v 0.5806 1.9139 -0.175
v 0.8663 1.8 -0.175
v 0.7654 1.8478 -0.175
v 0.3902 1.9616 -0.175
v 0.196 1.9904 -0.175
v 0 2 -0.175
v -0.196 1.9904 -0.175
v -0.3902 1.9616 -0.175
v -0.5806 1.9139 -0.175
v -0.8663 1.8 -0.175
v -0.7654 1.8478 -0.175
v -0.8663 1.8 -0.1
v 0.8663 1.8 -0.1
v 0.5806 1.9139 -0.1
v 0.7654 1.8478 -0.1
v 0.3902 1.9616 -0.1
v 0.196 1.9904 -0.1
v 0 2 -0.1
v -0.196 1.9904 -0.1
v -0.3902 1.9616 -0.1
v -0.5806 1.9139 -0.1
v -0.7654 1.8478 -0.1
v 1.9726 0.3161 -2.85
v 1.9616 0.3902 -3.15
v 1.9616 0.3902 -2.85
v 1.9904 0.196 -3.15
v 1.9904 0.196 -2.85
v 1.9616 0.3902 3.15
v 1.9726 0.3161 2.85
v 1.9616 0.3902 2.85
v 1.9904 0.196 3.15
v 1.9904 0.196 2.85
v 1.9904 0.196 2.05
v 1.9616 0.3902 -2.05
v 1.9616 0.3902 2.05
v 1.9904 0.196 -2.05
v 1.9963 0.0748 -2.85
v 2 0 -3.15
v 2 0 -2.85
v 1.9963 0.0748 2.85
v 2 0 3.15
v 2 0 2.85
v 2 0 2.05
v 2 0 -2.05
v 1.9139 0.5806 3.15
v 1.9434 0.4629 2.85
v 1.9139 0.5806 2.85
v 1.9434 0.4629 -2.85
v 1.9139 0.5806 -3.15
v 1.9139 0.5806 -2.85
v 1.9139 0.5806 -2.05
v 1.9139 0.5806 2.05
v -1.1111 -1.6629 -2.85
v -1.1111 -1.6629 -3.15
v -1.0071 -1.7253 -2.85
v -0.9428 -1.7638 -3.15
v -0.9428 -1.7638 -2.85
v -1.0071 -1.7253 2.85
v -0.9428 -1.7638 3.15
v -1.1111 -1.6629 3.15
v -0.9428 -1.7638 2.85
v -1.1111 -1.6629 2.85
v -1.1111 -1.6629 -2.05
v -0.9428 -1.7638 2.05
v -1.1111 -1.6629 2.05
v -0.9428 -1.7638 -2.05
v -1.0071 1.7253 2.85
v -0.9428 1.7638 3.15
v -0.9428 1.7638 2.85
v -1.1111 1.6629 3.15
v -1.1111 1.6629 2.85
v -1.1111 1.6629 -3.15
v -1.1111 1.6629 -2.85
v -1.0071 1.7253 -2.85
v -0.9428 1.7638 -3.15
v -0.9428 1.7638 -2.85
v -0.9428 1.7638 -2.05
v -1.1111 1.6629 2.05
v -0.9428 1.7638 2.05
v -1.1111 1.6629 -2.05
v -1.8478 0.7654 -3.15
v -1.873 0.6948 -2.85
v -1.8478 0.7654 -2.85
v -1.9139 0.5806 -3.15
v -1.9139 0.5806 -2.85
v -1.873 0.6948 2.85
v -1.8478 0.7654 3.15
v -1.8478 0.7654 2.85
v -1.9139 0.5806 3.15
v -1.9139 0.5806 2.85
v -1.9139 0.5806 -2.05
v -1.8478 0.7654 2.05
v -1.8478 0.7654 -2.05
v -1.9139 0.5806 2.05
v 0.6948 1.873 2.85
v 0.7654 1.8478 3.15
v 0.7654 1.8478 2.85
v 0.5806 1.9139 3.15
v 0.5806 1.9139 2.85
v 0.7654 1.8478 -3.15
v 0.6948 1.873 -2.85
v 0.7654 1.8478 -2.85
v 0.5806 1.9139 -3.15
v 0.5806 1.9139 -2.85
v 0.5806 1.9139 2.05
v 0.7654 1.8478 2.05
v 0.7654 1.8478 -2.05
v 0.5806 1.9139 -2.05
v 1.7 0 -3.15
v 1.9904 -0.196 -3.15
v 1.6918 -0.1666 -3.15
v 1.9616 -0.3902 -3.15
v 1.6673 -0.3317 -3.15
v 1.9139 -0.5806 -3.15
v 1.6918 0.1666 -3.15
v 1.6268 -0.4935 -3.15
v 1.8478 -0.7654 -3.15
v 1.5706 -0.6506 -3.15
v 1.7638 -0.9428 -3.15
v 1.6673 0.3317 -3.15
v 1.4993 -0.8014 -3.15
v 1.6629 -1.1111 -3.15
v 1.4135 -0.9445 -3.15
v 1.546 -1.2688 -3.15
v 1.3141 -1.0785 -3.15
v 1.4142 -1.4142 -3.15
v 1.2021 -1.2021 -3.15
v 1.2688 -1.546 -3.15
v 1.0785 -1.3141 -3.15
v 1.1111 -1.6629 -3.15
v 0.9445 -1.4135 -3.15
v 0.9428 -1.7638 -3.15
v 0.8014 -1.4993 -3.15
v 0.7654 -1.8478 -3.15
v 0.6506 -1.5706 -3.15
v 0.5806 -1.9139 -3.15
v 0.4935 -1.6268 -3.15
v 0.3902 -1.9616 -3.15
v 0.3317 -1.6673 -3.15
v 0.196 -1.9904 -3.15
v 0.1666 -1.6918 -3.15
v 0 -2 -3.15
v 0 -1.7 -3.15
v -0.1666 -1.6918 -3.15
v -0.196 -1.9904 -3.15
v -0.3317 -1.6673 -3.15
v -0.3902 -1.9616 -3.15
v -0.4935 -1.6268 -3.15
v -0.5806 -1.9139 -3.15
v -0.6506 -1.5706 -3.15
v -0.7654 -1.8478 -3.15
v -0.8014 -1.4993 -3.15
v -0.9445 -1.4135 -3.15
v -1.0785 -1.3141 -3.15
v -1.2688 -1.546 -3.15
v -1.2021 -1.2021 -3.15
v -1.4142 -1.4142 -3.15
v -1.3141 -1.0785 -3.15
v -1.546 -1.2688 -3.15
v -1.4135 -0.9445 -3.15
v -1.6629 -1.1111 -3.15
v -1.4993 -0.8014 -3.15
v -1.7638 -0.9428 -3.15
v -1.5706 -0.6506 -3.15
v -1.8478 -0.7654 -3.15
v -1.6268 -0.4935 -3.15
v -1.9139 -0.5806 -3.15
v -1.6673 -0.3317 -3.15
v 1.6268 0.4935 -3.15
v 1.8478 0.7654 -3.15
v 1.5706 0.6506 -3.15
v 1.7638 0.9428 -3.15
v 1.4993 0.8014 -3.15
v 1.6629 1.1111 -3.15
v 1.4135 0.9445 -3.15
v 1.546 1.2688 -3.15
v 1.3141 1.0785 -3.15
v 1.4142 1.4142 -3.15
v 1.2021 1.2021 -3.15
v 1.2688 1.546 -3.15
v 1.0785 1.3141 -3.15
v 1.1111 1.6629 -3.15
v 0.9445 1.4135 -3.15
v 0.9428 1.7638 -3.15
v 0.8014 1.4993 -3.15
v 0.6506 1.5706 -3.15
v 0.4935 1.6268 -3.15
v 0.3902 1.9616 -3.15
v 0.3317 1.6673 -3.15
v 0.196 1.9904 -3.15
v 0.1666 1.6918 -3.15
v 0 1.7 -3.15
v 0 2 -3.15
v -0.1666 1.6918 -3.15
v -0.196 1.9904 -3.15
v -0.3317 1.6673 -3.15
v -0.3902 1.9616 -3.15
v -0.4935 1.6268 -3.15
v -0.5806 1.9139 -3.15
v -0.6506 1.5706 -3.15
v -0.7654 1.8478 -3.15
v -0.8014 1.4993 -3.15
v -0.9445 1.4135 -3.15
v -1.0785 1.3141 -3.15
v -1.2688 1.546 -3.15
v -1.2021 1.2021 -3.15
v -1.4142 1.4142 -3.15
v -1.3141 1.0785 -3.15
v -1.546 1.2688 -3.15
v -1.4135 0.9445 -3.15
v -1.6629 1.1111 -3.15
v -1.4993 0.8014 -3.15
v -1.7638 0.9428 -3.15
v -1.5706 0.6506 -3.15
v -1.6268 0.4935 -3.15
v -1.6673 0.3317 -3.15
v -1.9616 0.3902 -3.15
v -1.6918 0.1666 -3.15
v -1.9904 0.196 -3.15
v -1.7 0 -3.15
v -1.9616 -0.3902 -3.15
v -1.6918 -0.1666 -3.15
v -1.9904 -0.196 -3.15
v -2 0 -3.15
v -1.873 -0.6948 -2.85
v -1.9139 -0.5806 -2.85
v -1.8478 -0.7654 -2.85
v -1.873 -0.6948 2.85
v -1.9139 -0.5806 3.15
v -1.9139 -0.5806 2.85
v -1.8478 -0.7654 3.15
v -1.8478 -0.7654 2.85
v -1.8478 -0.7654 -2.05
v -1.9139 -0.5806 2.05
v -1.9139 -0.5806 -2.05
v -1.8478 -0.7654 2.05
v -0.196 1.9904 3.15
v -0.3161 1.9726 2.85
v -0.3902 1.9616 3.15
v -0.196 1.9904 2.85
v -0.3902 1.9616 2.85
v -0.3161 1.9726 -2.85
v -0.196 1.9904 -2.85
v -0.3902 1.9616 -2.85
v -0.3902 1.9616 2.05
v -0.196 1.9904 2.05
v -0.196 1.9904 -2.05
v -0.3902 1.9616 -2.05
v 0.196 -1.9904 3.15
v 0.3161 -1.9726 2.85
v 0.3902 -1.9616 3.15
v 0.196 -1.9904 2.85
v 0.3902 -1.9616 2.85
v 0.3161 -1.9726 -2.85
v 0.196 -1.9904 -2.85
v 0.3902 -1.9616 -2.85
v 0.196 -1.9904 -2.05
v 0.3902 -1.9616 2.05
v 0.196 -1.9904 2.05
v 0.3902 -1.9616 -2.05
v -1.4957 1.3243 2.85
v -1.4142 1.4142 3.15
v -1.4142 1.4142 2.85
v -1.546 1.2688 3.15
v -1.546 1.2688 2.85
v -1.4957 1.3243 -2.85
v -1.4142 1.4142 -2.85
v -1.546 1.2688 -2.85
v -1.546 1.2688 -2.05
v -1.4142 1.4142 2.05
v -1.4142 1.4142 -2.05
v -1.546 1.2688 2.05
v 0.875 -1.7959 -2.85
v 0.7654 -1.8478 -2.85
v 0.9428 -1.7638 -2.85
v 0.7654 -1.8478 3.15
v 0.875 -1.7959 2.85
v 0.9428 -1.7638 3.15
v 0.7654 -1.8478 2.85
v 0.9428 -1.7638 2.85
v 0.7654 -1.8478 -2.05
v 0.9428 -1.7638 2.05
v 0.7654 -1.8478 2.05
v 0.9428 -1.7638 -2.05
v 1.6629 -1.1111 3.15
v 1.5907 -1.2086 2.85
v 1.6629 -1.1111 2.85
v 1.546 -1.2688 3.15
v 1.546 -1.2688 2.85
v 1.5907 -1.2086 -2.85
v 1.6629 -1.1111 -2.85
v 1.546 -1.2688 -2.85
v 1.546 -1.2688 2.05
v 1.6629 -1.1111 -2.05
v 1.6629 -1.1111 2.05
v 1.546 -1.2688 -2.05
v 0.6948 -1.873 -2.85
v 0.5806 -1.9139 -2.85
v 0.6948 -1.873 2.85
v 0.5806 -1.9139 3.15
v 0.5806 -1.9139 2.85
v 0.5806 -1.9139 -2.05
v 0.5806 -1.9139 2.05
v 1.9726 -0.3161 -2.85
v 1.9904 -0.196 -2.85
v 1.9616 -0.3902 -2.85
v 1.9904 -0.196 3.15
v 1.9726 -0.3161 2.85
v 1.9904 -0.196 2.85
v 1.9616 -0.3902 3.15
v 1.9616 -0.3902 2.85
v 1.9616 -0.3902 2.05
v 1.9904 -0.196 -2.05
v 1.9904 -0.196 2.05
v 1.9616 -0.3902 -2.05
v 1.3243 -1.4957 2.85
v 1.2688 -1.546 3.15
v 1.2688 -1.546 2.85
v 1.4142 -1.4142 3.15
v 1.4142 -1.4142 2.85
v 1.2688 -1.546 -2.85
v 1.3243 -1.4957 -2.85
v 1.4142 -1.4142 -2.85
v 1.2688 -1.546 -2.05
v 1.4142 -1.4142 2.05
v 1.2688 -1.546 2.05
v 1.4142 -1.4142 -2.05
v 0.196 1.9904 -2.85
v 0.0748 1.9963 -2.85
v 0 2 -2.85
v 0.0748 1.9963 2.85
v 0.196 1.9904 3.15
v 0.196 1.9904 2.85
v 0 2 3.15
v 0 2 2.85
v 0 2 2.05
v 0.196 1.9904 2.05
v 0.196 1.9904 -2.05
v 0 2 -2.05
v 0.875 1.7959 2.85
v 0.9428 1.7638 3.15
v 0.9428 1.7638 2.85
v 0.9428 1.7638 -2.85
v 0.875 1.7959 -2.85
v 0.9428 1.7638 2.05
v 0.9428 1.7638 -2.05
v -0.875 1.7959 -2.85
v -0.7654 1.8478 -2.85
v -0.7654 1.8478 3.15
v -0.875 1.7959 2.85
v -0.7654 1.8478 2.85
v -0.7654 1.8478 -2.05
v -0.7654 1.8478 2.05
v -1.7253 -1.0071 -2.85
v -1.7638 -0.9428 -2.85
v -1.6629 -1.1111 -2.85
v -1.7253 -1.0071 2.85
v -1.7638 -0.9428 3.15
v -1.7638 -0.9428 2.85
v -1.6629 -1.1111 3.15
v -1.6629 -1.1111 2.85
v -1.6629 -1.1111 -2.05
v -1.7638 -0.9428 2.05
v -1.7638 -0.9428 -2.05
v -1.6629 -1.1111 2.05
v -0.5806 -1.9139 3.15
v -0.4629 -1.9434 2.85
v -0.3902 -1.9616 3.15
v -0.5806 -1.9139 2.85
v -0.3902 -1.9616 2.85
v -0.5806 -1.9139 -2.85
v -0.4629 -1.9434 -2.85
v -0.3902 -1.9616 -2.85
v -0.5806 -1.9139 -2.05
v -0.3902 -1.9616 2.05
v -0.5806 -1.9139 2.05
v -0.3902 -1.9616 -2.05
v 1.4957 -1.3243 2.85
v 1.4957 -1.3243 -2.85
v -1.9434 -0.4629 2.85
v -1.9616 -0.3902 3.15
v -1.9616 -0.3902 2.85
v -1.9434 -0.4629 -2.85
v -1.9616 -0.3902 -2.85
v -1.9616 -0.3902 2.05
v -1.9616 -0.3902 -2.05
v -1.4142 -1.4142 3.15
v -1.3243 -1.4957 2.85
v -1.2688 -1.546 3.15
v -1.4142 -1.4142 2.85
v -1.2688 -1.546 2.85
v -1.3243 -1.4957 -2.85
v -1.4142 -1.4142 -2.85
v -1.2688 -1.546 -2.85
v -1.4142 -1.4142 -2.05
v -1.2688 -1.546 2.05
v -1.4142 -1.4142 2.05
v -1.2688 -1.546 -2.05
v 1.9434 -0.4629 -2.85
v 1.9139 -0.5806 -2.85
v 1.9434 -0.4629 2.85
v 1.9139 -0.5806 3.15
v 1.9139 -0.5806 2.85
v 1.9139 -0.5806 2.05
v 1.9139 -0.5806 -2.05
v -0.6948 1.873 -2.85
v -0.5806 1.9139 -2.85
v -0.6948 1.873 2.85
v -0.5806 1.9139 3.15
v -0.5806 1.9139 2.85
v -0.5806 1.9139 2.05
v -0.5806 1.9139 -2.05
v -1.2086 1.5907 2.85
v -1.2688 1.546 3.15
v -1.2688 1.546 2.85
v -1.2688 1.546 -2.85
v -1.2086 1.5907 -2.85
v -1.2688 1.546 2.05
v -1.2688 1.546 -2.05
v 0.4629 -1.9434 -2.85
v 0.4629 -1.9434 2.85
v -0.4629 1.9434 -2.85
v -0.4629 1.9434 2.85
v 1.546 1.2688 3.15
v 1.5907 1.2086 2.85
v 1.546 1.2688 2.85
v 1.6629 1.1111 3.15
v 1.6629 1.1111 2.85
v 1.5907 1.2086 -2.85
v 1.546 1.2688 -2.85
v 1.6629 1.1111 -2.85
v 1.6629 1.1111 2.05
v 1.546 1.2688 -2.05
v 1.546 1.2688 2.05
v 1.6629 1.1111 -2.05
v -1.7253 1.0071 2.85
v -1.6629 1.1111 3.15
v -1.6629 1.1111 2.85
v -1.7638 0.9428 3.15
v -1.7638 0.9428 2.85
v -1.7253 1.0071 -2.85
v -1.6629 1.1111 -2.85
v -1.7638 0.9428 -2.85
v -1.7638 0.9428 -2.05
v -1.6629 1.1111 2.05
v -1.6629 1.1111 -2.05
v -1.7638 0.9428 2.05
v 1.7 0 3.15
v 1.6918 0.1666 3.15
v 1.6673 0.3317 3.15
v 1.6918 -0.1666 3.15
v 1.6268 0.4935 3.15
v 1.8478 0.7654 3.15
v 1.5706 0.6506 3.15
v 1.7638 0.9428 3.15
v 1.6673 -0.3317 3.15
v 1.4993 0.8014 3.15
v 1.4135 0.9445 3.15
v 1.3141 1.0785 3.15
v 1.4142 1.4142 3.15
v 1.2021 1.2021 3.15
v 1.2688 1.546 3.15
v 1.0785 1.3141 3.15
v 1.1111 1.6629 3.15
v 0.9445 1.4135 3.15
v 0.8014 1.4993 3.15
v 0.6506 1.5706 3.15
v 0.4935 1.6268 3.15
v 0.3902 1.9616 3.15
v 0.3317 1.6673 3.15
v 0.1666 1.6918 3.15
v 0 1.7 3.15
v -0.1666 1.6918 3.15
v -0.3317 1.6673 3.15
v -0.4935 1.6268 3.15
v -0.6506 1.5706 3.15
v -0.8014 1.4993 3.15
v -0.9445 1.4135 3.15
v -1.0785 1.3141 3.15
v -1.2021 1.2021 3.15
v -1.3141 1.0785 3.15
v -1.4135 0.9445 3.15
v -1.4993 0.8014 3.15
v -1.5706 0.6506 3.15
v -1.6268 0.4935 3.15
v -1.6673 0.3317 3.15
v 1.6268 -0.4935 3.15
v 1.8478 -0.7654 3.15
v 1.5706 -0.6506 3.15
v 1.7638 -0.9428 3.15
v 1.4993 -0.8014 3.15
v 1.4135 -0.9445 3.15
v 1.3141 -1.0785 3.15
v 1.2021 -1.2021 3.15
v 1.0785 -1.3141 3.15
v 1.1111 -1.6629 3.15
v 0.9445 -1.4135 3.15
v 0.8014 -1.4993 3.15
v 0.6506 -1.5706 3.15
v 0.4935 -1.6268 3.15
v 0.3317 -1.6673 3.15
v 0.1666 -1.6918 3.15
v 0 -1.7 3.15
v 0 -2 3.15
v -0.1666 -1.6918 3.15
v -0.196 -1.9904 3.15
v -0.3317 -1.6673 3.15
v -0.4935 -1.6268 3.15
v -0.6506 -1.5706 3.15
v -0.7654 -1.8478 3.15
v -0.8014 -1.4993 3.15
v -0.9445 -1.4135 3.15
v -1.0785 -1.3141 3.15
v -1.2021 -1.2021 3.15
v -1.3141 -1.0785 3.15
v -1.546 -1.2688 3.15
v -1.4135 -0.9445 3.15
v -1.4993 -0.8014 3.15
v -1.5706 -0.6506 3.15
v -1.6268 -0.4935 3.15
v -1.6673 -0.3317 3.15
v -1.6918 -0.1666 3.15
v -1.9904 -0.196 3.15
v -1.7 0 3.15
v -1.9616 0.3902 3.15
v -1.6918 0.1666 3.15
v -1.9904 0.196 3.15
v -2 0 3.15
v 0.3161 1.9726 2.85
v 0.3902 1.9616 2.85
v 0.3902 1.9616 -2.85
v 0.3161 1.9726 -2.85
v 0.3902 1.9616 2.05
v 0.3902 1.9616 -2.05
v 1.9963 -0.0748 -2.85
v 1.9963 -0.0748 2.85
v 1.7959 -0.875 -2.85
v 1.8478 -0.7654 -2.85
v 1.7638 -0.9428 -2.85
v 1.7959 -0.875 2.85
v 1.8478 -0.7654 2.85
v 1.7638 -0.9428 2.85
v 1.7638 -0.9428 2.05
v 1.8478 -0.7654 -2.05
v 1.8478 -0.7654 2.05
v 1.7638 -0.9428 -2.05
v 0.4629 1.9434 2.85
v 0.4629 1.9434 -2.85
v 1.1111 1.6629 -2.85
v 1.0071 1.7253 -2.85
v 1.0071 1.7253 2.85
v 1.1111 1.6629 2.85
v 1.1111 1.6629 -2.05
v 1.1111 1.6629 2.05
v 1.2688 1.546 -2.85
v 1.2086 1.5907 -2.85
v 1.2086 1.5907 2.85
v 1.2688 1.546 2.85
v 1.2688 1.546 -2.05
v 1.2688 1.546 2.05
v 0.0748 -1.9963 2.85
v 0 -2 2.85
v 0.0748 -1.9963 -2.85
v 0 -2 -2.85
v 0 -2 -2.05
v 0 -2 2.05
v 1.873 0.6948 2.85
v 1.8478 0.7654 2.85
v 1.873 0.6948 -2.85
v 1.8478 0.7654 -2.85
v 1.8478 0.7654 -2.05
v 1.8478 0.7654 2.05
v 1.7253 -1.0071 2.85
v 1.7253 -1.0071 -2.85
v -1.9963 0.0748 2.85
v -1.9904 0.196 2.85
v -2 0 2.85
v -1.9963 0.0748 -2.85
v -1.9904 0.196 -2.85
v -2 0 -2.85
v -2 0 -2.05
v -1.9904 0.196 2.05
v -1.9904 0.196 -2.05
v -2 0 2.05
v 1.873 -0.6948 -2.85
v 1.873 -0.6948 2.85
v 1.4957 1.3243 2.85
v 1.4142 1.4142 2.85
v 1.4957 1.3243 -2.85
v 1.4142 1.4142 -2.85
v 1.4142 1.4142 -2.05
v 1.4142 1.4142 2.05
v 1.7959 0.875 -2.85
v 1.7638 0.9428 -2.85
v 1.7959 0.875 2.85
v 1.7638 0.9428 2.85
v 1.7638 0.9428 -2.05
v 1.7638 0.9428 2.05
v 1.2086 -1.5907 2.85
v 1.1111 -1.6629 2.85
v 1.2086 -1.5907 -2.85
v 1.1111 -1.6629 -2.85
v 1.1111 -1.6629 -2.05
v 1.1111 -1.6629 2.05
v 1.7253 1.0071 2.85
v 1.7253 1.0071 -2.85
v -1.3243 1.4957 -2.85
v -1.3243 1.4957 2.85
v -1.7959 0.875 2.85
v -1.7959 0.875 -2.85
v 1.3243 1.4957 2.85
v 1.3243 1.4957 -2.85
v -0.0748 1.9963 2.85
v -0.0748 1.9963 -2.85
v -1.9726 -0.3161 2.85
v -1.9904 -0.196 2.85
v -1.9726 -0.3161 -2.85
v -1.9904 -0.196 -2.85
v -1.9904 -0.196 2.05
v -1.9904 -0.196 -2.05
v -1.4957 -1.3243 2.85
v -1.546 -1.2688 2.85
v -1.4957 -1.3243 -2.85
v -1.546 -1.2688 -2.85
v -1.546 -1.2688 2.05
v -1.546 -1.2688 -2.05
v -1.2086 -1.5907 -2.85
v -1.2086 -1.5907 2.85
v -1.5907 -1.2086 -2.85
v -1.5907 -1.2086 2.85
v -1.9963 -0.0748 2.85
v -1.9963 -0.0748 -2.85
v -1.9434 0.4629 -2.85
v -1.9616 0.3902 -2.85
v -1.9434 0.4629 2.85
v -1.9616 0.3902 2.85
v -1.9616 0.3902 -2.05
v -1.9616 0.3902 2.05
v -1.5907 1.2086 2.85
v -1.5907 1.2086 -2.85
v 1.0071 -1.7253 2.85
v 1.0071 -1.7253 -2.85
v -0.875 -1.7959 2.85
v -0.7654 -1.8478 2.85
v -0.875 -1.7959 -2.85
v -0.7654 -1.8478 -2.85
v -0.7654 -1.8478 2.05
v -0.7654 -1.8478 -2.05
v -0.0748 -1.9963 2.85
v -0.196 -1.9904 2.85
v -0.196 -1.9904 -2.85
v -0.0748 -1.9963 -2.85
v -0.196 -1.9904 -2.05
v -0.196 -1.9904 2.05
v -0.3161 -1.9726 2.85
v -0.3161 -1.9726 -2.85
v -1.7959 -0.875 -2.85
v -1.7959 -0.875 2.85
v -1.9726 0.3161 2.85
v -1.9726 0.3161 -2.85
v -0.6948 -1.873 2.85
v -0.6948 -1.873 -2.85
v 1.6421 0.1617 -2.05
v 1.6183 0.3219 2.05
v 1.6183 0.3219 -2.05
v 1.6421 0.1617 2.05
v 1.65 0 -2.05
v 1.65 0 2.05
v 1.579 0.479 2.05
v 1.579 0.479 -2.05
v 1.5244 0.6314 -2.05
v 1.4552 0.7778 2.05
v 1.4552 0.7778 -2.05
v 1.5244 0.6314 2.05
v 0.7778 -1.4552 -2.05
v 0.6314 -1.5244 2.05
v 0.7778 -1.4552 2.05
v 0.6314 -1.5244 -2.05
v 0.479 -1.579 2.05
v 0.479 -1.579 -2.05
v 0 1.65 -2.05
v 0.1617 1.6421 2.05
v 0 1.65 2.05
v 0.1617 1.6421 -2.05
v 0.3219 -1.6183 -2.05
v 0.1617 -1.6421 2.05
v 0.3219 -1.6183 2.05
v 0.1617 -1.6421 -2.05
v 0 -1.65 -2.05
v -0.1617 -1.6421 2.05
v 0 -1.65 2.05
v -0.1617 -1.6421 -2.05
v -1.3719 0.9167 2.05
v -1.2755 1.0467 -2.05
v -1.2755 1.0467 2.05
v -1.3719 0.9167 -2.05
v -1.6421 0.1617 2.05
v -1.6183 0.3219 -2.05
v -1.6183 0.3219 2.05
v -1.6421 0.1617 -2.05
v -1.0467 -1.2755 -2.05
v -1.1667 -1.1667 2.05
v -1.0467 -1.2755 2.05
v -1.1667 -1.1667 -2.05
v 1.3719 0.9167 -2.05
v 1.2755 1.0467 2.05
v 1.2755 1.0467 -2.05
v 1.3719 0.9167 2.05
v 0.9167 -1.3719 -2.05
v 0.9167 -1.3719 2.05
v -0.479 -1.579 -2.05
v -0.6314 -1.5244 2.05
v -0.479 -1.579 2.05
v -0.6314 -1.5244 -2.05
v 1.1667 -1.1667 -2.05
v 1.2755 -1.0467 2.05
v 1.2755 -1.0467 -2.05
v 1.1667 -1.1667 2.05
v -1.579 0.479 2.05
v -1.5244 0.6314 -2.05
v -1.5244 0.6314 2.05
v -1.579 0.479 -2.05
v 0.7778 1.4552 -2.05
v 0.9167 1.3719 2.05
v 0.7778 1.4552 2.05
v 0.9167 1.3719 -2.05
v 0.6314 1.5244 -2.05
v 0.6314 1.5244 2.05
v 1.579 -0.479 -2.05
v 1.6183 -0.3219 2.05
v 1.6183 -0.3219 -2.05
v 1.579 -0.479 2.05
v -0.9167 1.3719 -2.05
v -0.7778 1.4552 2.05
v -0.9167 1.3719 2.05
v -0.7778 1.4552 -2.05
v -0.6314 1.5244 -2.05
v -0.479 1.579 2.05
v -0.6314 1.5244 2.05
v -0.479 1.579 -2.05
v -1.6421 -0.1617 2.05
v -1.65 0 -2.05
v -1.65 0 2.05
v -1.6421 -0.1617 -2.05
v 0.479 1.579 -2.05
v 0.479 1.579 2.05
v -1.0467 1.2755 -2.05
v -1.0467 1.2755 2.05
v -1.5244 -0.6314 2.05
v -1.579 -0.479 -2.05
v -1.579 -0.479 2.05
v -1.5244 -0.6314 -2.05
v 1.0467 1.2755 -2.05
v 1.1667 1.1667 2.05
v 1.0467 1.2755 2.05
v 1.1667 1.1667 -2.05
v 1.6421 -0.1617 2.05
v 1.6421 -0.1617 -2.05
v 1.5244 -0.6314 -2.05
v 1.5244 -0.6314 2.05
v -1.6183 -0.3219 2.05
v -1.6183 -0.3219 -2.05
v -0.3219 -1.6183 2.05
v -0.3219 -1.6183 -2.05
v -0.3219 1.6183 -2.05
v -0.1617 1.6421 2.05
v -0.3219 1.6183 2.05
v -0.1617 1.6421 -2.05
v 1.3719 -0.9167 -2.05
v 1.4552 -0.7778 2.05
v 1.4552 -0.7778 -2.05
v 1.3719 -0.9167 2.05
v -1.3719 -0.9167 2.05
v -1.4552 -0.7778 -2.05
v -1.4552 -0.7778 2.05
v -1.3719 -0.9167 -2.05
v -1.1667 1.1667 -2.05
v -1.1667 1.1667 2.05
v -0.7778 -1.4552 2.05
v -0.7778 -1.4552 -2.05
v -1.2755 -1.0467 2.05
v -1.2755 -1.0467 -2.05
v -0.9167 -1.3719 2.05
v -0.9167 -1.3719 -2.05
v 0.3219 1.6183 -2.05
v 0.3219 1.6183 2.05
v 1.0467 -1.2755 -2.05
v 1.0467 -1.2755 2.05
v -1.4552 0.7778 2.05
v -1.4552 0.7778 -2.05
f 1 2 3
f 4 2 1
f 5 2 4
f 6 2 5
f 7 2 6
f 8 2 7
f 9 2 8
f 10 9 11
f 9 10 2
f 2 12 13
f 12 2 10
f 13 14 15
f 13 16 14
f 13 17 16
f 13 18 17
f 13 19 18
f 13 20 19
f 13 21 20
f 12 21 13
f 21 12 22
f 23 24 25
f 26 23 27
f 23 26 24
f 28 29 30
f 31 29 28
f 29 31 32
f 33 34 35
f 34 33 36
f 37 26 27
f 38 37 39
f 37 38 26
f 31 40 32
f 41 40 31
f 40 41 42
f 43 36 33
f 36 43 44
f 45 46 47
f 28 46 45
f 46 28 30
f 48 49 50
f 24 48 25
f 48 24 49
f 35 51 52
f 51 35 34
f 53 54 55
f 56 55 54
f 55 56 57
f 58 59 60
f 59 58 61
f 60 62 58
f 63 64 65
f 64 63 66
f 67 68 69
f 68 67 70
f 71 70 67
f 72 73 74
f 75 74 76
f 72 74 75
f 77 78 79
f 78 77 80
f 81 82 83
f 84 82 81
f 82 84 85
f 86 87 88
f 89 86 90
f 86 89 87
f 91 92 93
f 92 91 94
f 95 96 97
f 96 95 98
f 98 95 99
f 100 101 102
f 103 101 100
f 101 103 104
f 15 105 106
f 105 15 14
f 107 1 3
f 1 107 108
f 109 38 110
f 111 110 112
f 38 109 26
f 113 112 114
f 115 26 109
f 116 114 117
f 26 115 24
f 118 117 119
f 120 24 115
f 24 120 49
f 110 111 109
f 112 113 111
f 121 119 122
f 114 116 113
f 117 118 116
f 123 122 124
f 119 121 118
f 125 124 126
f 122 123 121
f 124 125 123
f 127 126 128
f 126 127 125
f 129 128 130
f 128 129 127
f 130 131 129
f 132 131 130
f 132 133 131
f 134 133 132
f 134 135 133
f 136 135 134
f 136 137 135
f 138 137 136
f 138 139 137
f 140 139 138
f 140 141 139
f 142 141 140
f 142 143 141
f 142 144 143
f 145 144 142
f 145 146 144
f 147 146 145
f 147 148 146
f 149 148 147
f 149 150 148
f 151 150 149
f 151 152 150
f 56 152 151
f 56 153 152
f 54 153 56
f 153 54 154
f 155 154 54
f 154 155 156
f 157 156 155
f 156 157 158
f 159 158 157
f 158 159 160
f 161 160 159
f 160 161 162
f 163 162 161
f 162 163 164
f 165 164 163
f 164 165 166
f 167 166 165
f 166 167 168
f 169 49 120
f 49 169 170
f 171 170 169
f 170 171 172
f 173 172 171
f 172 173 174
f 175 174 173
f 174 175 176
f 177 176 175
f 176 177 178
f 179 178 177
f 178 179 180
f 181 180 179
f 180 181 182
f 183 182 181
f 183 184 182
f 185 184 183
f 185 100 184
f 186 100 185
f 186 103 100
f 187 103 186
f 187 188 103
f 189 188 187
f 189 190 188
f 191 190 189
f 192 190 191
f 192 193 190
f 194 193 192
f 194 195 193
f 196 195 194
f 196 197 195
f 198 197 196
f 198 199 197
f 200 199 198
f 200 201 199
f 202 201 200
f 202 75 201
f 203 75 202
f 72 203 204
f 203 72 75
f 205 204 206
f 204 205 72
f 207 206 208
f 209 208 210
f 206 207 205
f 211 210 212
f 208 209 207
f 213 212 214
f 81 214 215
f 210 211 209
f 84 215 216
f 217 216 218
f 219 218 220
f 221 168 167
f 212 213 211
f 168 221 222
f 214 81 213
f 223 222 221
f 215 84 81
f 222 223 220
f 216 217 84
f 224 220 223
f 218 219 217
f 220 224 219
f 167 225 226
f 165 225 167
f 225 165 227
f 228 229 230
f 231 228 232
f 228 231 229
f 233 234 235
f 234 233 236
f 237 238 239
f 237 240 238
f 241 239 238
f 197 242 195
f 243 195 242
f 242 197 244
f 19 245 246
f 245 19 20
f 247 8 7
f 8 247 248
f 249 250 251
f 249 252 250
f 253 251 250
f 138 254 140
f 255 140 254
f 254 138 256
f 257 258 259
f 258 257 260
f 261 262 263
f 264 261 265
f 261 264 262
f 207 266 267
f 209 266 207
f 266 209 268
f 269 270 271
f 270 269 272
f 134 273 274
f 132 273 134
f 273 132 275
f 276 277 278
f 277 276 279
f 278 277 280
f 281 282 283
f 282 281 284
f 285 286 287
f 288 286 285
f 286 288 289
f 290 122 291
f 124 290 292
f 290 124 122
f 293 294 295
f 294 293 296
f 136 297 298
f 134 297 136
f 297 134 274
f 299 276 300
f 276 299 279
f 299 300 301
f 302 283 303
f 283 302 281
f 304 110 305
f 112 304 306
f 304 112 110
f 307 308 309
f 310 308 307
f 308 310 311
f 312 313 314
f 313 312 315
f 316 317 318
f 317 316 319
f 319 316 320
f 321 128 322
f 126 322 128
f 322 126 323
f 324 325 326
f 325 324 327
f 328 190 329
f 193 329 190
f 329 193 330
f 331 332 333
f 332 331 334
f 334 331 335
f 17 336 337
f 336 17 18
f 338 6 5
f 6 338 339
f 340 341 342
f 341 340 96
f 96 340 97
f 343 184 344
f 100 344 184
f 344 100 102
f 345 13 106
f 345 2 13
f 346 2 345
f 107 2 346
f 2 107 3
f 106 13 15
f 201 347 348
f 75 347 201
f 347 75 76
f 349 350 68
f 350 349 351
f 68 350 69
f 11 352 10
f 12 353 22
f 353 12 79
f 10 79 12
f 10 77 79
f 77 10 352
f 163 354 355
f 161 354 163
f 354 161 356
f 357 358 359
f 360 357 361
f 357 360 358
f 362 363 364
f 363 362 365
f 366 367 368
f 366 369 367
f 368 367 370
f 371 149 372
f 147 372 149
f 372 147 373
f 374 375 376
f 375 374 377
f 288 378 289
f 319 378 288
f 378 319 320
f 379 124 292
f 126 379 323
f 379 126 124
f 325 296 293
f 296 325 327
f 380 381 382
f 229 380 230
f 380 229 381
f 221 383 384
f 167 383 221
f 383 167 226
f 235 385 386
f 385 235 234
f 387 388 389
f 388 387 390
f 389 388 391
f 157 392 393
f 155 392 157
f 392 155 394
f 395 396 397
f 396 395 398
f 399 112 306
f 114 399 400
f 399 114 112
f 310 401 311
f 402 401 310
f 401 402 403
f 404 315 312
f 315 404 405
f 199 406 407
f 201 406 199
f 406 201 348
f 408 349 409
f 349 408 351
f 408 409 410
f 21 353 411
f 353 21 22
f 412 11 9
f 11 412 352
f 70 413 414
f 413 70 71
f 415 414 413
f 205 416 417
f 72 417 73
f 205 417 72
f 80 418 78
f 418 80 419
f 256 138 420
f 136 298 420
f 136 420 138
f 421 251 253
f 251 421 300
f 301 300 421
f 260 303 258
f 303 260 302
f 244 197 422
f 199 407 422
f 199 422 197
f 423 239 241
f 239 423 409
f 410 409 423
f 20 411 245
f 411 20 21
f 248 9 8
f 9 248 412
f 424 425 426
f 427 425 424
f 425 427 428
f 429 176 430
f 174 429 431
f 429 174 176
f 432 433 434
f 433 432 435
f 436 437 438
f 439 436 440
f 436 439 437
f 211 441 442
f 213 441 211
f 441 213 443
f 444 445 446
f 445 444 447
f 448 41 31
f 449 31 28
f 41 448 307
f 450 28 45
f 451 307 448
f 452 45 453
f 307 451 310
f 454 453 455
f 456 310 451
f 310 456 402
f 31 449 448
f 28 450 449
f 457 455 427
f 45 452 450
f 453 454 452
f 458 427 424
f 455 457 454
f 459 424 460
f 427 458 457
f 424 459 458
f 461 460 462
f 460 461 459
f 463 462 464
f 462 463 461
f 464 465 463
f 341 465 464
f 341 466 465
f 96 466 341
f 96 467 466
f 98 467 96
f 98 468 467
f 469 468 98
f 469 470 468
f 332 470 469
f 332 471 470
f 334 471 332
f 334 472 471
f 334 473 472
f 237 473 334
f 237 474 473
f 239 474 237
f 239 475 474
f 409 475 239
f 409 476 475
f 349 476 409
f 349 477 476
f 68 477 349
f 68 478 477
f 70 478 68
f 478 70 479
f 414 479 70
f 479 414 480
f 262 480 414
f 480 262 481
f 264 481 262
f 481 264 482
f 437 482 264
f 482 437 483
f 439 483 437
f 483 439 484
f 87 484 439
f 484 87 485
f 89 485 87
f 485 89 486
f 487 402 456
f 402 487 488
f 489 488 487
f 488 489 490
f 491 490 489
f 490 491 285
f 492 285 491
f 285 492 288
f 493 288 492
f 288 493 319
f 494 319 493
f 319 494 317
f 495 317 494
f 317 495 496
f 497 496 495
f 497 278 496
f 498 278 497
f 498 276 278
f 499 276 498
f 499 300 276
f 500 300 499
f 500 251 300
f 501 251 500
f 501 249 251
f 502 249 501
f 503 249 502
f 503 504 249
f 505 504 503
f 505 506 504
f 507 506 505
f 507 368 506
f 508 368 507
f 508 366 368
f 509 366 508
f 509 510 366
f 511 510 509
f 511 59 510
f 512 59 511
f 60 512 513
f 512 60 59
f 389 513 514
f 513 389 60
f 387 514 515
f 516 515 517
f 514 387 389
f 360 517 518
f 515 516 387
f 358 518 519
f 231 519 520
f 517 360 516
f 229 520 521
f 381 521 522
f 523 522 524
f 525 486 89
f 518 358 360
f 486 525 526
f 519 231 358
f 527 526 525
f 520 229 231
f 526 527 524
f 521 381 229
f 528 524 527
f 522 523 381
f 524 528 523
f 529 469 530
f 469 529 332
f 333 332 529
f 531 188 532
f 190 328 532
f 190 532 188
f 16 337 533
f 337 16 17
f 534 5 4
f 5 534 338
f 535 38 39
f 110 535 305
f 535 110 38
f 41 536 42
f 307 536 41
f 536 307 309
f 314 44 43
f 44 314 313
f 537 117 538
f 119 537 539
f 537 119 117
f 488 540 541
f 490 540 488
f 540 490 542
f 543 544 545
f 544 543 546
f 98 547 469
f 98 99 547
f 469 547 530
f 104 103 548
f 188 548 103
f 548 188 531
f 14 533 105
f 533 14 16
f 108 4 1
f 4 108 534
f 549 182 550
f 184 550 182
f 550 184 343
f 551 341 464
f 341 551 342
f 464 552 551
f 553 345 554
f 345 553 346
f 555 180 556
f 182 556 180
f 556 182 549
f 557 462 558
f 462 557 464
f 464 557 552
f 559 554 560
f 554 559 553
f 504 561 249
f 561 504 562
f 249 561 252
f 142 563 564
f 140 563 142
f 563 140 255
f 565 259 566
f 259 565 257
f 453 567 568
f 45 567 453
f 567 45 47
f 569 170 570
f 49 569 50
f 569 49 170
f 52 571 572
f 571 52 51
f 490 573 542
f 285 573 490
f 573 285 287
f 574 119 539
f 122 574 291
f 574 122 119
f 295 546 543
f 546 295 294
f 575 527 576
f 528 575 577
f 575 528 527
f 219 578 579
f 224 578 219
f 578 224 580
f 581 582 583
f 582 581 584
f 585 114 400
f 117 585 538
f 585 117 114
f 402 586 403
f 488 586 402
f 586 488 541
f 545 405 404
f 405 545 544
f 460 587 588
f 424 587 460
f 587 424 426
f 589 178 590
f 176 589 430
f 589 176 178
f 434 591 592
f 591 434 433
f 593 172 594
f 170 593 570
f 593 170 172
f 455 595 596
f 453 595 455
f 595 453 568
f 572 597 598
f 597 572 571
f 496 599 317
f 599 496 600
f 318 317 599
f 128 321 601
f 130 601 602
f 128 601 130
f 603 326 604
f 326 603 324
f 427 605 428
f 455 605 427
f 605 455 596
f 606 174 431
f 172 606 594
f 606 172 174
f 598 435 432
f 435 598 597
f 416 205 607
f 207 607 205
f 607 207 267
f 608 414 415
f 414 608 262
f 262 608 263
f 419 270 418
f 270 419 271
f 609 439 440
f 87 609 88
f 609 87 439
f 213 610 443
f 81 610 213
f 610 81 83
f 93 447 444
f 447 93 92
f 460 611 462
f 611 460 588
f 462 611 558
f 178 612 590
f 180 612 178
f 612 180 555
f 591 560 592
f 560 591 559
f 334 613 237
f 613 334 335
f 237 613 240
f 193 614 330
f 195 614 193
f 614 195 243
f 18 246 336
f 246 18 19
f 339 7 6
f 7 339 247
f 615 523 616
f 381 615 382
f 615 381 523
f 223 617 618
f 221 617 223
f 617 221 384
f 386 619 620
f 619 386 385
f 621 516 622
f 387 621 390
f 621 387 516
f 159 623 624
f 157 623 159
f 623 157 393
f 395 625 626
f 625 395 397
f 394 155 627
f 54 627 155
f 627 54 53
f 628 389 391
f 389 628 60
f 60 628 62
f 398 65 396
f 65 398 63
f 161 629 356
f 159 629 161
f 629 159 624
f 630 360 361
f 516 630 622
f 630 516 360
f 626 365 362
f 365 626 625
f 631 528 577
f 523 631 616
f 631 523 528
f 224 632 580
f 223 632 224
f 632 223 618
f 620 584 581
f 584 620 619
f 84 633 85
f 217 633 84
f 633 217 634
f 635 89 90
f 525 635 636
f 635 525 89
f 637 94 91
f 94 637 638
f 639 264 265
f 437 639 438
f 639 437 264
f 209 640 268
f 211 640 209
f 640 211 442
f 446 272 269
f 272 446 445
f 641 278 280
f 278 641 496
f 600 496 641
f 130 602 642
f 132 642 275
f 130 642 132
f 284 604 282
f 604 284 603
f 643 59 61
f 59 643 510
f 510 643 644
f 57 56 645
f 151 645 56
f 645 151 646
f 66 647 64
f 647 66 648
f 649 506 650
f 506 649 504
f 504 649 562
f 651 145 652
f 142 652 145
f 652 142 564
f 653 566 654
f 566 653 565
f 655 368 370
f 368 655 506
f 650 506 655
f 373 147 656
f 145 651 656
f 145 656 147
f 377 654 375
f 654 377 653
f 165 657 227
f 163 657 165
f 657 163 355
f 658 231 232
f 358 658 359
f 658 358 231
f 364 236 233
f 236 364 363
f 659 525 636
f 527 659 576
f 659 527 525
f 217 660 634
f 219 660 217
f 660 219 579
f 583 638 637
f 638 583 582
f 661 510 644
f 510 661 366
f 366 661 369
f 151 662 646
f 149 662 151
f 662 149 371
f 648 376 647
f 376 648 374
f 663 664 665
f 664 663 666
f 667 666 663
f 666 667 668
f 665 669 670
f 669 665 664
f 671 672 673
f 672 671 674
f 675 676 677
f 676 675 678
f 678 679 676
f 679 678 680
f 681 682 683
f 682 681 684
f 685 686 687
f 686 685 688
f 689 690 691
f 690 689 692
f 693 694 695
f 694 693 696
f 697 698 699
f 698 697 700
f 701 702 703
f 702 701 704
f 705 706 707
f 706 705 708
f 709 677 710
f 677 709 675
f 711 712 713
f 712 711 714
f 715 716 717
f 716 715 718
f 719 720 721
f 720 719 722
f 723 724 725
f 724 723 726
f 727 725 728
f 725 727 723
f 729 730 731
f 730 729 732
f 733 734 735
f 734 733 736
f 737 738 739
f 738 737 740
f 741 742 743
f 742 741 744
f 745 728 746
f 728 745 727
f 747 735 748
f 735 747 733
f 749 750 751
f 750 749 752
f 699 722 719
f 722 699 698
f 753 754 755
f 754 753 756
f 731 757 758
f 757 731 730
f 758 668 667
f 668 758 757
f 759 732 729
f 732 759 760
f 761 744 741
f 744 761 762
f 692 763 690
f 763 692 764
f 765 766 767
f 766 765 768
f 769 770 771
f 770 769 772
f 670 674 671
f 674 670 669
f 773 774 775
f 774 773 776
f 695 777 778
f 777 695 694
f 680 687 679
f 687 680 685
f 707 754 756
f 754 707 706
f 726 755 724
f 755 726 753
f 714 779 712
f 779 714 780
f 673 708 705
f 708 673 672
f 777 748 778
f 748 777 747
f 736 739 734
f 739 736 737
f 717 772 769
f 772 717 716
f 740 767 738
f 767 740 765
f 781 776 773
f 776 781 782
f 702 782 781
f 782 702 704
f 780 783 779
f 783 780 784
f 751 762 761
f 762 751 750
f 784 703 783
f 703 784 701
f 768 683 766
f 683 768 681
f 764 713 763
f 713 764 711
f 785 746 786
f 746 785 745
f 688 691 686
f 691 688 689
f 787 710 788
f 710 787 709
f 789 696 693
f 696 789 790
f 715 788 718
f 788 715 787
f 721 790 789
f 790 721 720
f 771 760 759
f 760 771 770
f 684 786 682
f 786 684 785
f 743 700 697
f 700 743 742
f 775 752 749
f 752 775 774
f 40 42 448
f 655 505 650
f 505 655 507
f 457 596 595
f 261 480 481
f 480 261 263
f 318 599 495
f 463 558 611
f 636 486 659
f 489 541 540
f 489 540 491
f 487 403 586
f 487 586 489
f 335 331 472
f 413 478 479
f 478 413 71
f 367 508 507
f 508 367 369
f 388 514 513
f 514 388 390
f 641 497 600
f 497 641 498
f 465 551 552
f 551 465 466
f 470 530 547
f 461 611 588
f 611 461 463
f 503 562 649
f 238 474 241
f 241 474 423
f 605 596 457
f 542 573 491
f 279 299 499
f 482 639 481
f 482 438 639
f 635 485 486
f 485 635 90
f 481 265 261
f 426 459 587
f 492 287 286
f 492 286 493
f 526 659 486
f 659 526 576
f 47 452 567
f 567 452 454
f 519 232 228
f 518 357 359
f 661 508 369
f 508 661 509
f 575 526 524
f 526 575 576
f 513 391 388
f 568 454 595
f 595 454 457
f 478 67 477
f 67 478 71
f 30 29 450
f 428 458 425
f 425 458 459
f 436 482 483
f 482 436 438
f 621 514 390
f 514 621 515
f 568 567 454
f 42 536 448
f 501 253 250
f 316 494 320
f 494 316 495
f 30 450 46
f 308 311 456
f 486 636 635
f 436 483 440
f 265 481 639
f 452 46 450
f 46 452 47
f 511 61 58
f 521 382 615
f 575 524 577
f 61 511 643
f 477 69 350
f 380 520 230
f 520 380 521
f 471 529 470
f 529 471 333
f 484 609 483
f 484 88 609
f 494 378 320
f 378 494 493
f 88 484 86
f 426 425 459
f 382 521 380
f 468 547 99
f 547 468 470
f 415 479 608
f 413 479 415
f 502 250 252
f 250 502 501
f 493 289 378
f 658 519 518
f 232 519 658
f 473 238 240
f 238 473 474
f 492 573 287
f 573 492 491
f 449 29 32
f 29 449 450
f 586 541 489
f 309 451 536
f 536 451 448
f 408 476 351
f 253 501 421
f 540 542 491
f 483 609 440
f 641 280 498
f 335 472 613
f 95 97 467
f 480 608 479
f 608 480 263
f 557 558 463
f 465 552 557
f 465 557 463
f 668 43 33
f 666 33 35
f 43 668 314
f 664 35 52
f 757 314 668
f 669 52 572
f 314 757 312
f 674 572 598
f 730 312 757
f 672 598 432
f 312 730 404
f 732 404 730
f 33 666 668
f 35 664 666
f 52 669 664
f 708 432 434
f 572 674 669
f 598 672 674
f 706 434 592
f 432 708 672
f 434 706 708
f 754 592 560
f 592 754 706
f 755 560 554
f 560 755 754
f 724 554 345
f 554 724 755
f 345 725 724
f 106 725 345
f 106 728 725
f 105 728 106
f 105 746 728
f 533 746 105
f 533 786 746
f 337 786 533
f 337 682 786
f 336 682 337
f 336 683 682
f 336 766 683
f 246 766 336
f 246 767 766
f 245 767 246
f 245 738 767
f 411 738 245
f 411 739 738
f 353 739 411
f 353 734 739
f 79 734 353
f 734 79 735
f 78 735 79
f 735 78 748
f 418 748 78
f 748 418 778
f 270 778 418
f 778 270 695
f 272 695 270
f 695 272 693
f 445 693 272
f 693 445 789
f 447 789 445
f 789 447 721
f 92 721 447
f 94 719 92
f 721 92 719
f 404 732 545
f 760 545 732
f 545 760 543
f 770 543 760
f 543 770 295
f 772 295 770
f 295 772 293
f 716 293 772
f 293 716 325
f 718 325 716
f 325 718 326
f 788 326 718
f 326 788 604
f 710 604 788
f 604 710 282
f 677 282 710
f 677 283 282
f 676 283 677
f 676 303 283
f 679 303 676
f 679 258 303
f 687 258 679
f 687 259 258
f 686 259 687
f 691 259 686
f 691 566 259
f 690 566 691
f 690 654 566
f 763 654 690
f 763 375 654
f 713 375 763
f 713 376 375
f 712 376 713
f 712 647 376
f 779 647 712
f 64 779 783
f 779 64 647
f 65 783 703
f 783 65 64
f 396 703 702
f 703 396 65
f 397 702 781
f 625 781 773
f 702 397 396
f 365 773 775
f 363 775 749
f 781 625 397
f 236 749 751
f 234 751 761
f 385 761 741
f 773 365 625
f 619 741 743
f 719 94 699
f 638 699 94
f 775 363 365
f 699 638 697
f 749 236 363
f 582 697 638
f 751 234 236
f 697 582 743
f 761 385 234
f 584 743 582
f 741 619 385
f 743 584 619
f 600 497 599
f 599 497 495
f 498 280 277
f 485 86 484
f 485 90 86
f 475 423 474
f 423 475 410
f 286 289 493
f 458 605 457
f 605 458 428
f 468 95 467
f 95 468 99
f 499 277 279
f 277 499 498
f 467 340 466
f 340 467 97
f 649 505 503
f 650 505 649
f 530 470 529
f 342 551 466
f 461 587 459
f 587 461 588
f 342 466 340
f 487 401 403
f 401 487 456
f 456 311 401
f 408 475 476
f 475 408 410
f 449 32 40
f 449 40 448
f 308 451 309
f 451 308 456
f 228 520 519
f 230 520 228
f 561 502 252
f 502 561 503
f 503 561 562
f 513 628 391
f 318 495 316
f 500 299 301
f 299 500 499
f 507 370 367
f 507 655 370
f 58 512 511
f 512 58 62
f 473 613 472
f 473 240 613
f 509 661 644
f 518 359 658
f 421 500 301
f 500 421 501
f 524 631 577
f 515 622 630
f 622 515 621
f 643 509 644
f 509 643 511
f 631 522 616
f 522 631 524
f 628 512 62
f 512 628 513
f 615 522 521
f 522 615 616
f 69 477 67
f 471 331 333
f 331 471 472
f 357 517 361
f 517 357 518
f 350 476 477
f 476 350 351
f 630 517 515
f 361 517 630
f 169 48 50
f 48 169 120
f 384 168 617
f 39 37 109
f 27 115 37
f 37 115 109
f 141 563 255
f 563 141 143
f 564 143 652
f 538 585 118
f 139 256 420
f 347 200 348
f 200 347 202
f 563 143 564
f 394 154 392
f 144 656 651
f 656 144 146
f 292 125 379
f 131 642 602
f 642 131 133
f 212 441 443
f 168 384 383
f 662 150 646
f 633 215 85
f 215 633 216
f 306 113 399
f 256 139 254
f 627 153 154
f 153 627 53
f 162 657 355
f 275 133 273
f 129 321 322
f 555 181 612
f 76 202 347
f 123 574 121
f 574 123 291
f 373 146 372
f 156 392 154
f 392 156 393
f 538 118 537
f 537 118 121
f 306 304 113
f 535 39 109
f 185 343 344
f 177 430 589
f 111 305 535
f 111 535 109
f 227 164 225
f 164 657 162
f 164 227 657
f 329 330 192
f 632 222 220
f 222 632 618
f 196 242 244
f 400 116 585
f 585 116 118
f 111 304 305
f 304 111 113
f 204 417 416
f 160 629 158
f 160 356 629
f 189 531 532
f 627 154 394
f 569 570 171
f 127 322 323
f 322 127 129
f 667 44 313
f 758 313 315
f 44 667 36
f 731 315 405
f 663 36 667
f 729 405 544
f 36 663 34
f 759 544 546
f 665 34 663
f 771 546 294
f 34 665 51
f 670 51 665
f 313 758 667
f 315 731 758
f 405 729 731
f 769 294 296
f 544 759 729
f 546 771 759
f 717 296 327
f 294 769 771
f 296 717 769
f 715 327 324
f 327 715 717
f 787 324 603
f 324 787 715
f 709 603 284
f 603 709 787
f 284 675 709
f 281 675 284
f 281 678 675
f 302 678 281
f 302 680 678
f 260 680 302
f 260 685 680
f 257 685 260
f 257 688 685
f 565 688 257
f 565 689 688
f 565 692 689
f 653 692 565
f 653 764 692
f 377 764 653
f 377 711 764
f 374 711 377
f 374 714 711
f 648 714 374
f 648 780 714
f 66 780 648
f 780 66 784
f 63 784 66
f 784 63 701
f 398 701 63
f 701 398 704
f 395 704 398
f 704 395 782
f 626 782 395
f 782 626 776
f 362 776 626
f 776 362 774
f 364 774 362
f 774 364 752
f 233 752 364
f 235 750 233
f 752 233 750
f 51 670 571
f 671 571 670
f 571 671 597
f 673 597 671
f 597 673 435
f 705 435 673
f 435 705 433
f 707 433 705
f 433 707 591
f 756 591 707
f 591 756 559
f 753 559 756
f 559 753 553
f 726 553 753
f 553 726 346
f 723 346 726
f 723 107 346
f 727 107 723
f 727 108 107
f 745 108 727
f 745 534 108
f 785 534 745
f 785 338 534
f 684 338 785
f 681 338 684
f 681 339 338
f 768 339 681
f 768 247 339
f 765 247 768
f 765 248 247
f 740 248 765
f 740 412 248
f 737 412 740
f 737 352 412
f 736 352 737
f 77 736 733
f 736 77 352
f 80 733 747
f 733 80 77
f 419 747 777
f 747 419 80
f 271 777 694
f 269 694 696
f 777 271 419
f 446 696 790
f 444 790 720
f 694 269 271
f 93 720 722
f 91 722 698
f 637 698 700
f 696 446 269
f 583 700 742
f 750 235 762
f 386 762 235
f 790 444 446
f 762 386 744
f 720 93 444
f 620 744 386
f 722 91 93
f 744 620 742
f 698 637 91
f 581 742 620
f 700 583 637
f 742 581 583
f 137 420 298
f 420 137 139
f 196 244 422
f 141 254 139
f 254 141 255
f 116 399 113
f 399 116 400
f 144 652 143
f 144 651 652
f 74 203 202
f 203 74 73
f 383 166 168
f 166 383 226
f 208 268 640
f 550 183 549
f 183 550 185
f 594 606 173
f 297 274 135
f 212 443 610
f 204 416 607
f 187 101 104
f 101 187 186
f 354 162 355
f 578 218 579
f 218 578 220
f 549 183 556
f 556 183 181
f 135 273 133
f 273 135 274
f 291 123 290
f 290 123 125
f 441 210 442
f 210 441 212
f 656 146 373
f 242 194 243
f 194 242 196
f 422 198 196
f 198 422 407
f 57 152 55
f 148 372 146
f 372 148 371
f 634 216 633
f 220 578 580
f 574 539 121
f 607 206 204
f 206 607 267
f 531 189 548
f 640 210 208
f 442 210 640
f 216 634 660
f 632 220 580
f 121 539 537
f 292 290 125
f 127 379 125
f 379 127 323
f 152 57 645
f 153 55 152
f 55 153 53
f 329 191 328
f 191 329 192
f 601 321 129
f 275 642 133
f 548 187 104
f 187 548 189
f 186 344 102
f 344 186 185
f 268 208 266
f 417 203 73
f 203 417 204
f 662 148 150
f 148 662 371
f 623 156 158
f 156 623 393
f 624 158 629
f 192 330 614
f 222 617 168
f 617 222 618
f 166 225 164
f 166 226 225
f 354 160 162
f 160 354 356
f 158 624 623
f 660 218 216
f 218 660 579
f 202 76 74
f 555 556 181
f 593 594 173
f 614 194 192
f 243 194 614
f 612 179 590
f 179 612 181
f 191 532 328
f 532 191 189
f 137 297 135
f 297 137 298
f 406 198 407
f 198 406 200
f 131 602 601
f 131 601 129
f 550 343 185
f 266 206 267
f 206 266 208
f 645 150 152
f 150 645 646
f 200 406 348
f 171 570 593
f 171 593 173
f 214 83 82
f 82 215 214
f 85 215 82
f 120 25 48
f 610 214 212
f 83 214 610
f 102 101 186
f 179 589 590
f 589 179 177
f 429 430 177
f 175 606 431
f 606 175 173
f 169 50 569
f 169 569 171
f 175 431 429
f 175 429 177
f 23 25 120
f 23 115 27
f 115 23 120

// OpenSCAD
// Parameters
outer_diameter_mm = 4.0; //[2.0:8.0:0.1]
length_mm = 6.3; //[3.15:12.6:0.1]
screw_nominal_diameter_mm = 4.0; //[2.0:8.0:0.1]
internal_thread_pitch_mm = 0.7; //[0.35:1.4:0.05]
internal_thread_minor_diameter_mm = 3.3; //[2.5:4.0:0.05]
end_chamfer_mm = 0.3; //[0.15:0.8:0.05]
outer_retention_depth_mm = 0.2; //[0.1:0.6:0.05]
outer_retention_pitch_mm = 0.8; //[0.4:1.6:0.05]
rib_groove_width_mm = 0.35; //[0.2:0.8:0.05]
rib_count = 8; //[6:16:1]
overlap_mm = 0.8; //[0.5:2.0:0.1]

// Threaded Insert - complete geometry
module threaded_insert() {
  color("Brass") {
    difference() {
      // Insert body
      translate([0, 0, 0])
        cylinder(r=outer_diameter_mm/2, h=length_mm, center=true, $fn=64);
      
      // Internal bore
      translate([0, 0, 0])
        cylinder(r=internal_thread_minor_diameter_mm/2, h=length_mm + 2*overlap_mm, center=true, $fn=64);
      
      // Lead-in chamfers
      translate([0, 0, length_mm/2 - (end_chamfer_mm + overlap_mm)/2])
        cylinder(r1=outer_diameter_mm/2 + overlap_mm, r2=outer_diameter_mm/2 - end_chamfer_mm, h=end_chamfer_mm + overlap_mm, center=true, $fn=64);
      translate([0, 0, -length_mm/2 + (end_chamfer_mm + overlap_mm)/2])
        cylinder(r1=outer_diameter_mm/2 - end_chamfer_mm, r2=outer_diameter_mm/2 + overlap_mm, h=end_chamfer_mm + overlap_mm, center=true, $fn=64);
      
      // Outer retention grooves
      intersection() {
        union() {
          for (i = [0:rib_count-1]) {
            rotate([0, 0, i*360/rib_count])
              translate([0, outer_diameter_mm/2 - outer_retention_depth_mm/2, 0])
                cube([2*(outer_diameter_mm/2 + overlap_mm), outer_retention_depth_mm, rib_groove_width_mm], center=true);
          }
        }
        union() {
          for (j = [0:7]) {
            translate([0, outer_diameter_mm/2 - outer_retention_depth_mm/2, -(length_mm/2 - end_chamfer_mm) + rib_groove_width_mm/2 + j*outer_retention_pitch_mm])
              cube([2*(outer_diameter_mm/2 + overlap_mm), outer_retention_depth_mm, rib_groove_width_mm], center=true);
          }
        }
      }
    }
  }
}

// Assembly
module assembly() {
  threaded_insert();
}

assembly();
